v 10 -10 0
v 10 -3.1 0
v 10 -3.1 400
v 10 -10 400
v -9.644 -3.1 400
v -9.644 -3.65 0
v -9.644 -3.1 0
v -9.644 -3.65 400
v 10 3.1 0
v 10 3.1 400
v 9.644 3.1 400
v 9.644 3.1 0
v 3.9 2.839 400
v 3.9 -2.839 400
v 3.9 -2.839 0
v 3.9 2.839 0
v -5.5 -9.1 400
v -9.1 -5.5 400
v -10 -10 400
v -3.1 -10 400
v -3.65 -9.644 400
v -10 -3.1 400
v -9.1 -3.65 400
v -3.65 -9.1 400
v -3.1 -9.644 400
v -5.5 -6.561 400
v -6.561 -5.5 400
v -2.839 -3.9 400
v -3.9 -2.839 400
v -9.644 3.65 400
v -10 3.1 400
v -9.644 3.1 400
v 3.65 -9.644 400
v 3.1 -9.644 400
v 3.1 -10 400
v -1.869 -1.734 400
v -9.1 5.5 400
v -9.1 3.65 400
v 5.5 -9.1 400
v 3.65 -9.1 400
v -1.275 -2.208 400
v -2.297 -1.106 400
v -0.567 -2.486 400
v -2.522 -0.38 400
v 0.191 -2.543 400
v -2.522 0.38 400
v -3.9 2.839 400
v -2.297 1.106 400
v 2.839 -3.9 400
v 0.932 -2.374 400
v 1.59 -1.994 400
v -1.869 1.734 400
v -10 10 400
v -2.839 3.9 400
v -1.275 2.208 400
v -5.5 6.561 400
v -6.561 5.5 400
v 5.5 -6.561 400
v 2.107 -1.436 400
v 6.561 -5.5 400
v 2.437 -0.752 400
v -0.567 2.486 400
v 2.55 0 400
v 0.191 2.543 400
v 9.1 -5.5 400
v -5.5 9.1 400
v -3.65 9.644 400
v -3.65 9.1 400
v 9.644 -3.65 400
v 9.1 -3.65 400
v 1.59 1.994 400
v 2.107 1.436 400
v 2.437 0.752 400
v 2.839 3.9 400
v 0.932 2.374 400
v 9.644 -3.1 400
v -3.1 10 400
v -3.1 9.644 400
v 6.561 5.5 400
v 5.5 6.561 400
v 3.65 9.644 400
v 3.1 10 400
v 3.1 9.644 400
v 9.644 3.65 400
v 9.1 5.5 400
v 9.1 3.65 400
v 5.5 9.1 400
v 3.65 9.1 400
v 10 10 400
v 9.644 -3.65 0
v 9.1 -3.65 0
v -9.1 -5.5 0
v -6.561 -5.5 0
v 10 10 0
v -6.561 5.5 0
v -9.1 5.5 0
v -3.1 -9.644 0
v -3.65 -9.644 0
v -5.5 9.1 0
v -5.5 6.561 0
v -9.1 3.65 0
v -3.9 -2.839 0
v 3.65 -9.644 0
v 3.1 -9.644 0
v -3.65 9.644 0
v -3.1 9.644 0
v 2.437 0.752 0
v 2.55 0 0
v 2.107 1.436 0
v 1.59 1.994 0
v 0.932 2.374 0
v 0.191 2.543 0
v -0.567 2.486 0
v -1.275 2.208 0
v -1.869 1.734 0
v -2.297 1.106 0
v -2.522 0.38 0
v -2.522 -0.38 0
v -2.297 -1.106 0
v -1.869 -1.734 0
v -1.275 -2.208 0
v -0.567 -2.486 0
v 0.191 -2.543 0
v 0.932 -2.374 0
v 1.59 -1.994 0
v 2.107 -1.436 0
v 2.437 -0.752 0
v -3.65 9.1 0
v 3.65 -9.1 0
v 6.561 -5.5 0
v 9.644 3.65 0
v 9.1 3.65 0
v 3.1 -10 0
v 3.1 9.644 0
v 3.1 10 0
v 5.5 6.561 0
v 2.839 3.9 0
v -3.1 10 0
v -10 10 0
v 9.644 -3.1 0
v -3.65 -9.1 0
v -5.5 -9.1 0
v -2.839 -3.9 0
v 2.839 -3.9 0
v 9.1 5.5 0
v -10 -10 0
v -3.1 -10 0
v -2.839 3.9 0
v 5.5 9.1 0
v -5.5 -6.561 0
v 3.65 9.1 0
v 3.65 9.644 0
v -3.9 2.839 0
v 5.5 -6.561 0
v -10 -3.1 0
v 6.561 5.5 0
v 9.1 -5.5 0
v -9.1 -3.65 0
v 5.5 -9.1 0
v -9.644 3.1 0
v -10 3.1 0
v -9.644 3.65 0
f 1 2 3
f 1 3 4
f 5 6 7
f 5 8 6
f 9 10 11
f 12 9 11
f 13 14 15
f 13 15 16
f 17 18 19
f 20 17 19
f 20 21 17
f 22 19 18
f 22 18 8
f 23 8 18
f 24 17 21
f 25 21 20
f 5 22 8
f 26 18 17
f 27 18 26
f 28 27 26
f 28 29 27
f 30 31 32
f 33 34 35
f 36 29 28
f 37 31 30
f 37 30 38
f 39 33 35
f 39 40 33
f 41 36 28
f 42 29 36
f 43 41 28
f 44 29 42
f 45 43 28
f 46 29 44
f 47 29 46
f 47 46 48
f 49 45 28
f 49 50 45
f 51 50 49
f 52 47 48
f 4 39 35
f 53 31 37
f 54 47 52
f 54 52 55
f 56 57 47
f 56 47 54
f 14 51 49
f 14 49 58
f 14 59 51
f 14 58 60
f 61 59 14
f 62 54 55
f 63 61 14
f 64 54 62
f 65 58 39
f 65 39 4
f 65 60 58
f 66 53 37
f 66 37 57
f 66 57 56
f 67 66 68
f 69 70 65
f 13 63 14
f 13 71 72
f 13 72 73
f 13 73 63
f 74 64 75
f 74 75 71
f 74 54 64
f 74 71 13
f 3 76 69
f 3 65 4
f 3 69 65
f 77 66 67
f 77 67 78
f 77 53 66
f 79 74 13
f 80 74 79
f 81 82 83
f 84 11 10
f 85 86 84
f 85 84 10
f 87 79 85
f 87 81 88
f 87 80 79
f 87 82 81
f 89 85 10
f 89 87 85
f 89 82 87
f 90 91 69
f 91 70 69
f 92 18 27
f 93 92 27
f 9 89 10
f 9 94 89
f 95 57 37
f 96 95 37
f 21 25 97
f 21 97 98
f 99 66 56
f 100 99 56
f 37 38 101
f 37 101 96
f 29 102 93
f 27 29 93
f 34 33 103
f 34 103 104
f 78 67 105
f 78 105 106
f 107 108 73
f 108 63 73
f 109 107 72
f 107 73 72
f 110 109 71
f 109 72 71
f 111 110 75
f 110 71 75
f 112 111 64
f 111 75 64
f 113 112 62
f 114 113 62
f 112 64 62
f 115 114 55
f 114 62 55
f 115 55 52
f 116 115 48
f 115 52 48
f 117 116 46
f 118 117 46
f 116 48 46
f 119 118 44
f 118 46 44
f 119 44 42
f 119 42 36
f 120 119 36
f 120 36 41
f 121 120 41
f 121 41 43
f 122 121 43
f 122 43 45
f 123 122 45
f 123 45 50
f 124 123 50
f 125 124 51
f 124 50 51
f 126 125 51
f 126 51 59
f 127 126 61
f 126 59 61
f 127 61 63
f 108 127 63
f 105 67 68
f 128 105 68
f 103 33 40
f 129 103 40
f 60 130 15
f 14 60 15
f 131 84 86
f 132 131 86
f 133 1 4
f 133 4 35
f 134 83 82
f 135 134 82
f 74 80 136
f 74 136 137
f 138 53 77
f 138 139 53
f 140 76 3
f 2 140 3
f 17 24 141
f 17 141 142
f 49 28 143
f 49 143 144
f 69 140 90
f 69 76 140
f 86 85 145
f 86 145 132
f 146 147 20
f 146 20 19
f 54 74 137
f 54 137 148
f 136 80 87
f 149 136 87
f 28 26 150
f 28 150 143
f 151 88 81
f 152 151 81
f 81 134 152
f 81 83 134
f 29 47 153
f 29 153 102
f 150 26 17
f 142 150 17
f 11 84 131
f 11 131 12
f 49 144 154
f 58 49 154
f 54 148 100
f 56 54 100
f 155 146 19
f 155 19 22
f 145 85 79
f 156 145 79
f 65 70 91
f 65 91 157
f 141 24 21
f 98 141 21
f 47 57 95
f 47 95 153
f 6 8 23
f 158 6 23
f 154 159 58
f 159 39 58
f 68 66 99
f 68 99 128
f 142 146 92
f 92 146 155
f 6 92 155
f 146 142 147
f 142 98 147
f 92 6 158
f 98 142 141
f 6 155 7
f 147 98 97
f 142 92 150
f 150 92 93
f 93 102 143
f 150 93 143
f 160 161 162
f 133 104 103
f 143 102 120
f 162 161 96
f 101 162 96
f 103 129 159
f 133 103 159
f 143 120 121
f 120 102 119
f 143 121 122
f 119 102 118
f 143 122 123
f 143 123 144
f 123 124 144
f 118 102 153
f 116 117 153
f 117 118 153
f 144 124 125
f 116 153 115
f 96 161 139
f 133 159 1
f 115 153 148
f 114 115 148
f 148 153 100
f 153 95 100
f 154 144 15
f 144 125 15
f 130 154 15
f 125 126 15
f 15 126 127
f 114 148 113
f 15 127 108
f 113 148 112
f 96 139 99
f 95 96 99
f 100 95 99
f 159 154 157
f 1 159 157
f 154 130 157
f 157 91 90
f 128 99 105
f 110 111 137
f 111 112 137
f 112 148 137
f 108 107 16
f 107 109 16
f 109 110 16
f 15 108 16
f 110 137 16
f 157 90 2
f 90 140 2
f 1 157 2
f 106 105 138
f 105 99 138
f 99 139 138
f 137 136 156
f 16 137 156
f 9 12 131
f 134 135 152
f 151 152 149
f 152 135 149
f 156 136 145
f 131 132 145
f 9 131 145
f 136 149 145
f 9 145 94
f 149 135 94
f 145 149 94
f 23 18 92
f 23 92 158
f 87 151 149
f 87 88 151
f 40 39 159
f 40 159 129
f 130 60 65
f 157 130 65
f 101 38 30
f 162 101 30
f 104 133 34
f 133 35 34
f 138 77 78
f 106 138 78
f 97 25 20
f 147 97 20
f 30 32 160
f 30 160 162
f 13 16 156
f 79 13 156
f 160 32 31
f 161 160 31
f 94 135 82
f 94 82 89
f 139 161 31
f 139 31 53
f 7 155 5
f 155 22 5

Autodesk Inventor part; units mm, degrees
ref_plane "YZ Plane" through (0, 0, 0) normal (1, 0, 0) x (0, 1, 0)
ref_plane "XZ Plane" through (0, 0, 0) normal (0, 1, 0) x (-1, 0, 0)
ref_plane "XY Plane" through (0, 0, 0) normal (0, 0, 1) x (1, 0, 0)
sketch "草图1" plane through (0, 0, 0) normal (0, 0, 1) x (1, 0, 0)
  line L0 (10, -10) -> (-10, -10)
  line L1 (-10, -10) -> (-10, 10)
  line L2 (-10, 10) -> (10, 10)
  line L3 (10, 10) -> (10, -10)
  line L4 (10, -10) -> (-10, 10) construction
  line L5 (-10, -10) -> (10, 10) construction
  point P0 (0, 0)
  dimension "d0" = 20
  dimension "d1" = 20
extrude "拉伸1" add sketch "草图1" along normal blind 400
sketch "草图2" plane through (0, 0, 400) normal (0, 0, 1) x (1, 0, 0)
  circle A0 centre (0, 0) radius 2.55
  line L0 (-11.0615, 0) -> (0, 0)
  line L1 (0, 0) -> (0, 11.55)
  line L2 (-10, 10) -> (-10, -10)
  line L3 (10, 10) -> (-10, 10)
  line L4 (0, 3.9) -> (-3.9, 3.9)
  line L5 (-3.9, 3.9) -> (-3.9, 0)
  line L6 (-10, 10) -> (0, 0)
  line L7 (0, 1.0607) -> (-8.9393, 10)
  line L8 (-1.0607, 0) -> (-10, 8.9393)
  line L9 (-10, 10) -> (-3.1, 10)
  line L10 (-10, 3.1) -> (-10, 10)
  line L11 (-10, 10) -> (-3.65, 10)
  line L12 (-10, 3.65) -> (-10, 10)
  line L13 (-5.5, 12.0125) -> (-5.5, 5.5)
  line L14 (-10, 10) -> (-5.5, 10)
  line L15 (-5.5, 10) -> (-5.5, 5.5)
  line L16 (-5.5, 5.5) -> (-10, 5.5)
  line L17 (-10, 5.5) -> (-10, 10)
  line L18 (-5.5, 9.1) -> (0, 9.1)
  line L19 (-3.65, 10) -> (-3.65, 9.1)
  line L20 (-3.1, 10) -> (-3.1, 9.1)
  line L21 (-3.65, 9.6441) -> (-3.1, 9.6441)
  point P0 (-3.1, 9.55)
  point P1 (-2.8393, 3.9)
  point P2 (0, 10)
  point P3 (-5.5, 6.5607)
  dimension "d4" = 5.1
  dimension "d5" = 6.1
  dimension "d6" = 1.5
  dimension "d7" = 5.5
  dimension "d8" = 0.9
  dimension "d9" = 3.1
  dimension "d10" = 3.65
extrude "拉伸2" cut sketch "草图2" against normal up to surface (400 mm away) contours A0 L0 L1 | L1 L7 A0 | A0 L8 L0 | L7 L1 L6 A0 | L4 L7 L13 L18 L1 | A0 L6 L0 L8 | L18 L20 L3 L1 | L18 L19 L21 L20
mirror "镜像1" about plane through (0, 10, 400) normal (-1, 0, 0) of "拉伸2"
pattern_circular "环形阵列1" count 4 over 360 about axis through (0, 0, 400) along (0, 0, -1) of "拉伸2", "镜像1"
properties part number "铝方管2020x2"
